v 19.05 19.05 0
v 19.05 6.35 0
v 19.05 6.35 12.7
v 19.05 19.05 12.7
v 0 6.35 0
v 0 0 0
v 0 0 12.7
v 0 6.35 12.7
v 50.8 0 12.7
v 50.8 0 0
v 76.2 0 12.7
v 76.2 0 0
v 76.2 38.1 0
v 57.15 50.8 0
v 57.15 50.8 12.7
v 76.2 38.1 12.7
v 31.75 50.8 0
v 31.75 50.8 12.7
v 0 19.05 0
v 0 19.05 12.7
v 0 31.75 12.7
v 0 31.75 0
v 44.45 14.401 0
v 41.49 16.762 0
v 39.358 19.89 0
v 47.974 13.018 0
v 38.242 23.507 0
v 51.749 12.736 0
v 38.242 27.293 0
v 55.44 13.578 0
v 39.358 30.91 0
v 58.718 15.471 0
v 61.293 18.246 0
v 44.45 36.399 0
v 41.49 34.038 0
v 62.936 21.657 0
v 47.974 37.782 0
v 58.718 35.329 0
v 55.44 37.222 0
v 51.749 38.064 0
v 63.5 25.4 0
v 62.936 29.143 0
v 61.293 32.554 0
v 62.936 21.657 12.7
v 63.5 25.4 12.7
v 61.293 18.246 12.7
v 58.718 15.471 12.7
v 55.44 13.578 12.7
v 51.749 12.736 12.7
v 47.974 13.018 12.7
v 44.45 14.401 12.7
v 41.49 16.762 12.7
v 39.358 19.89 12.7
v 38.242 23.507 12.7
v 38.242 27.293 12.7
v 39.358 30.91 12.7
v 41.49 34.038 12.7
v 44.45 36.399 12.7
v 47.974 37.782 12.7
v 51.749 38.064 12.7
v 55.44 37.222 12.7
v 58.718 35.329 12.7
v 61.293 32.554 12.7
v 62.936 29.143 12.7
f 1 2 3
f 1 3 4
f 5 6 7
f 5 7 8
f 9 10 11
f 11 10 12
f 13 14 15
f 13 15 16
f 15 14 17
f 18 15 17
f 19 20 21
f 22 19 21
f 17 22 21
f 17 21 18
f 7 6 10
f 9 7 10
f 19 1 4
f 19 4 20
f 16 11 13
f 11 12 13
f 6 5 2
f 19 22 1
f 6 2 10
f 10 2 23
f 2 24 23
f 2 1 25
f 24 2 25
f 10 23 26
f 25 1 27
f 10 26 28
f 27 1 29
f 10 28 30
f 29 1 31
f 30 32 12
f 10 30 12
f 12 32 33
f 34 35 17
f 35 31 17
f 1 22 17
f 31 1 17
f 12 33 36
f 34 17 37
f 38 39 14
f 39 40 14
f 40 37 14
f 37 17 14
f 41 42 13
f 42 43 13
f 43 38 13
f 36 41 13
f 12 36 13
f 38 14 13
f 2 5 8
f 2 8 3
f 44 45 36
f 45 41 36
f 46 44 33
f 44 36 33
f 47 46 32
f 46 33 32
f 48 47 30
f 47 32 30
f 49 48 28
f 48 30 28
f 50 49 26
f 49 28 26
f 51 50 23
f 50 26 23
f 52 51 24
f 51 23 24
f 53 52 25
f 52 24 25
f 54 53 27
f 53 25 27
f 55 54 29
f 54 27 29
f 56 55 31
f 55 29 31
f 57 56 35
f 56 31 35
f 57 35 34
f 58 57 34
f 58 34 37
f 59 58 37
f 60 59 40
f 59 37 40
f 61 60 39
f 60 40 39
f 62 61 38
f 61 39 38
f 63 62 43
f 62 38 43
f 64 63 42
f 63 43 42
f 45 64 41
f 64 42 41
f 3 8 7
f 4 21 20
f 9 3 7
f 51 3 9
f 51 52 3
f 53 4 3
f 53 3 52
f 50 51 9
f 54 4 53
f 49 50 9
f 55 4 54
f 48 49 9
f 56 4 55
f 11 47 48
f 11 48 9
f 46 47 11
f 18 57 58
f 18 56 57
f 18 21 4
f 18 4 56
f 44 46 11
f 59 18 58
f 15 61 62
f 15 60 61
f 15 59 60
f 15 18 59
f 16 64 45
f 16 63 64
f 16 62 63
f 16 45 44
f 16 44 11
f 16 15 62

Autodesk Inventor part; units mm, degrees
ref_plane "YZ Plane" through (0, 0, 0) normal (1, 0, 0) x (0, 1, 0)
ref_plane "XZ Plane" through (0, 0, 0) normal (0, 1, 0) x (-1, 0, 0)
ref_plane "XY Plane" through (0, 0, 0) normal (0, 0, 1) x (1, 0, 0)
sketch "Sketch1" plane through (0, 0, 0) normal (0, 0, 1) x (1, 0, 0)
  line L0 (0, 0) -> (76.2, 0)
  line L1 (76.2, 0) -> (76.2, 38.1)
  line L2 (57.15, 50.8) -> (31.75, 50.8)
  line L3 (57.15, 50.8) -> (76.2, 38.1)
  line L4 (0, 0) -> (0, 6.35)
  line L5 (0, 6.35) -> (19.05, 6.35)
  line L6 (19.05, 6.35) -> (19.05, 19.05)
  line L7 (19.05, 19.05) -> (0, 19.05)
  line L8 (0, 19.05) -> (0, 31.75)
  line L9 (0, 31.75) -> (31.75, 50.8)
  line L10 (76.2, 0) -> (50.8, 0)
  circle A0 centre (50.8, 25.4) radius 12.7
  dimension "d0" = 76.2
  dimension "d1" = 38.1
  dimension "d4" = 25.4
  dimension "d5" = 6.35
  dimension "d6" = 19.05
  dimension "d7" = 12.7
  dimension "d8" = 19.05
  dimension "d9" = 12.7
  dimension "d10" = 25.4
  dimension "d12" = 25.4
extrude "Extrusion1" add sketch "Sketch1" along normal blind 12.7
properties part number "Assignment 1.1 - Inclined Support"
